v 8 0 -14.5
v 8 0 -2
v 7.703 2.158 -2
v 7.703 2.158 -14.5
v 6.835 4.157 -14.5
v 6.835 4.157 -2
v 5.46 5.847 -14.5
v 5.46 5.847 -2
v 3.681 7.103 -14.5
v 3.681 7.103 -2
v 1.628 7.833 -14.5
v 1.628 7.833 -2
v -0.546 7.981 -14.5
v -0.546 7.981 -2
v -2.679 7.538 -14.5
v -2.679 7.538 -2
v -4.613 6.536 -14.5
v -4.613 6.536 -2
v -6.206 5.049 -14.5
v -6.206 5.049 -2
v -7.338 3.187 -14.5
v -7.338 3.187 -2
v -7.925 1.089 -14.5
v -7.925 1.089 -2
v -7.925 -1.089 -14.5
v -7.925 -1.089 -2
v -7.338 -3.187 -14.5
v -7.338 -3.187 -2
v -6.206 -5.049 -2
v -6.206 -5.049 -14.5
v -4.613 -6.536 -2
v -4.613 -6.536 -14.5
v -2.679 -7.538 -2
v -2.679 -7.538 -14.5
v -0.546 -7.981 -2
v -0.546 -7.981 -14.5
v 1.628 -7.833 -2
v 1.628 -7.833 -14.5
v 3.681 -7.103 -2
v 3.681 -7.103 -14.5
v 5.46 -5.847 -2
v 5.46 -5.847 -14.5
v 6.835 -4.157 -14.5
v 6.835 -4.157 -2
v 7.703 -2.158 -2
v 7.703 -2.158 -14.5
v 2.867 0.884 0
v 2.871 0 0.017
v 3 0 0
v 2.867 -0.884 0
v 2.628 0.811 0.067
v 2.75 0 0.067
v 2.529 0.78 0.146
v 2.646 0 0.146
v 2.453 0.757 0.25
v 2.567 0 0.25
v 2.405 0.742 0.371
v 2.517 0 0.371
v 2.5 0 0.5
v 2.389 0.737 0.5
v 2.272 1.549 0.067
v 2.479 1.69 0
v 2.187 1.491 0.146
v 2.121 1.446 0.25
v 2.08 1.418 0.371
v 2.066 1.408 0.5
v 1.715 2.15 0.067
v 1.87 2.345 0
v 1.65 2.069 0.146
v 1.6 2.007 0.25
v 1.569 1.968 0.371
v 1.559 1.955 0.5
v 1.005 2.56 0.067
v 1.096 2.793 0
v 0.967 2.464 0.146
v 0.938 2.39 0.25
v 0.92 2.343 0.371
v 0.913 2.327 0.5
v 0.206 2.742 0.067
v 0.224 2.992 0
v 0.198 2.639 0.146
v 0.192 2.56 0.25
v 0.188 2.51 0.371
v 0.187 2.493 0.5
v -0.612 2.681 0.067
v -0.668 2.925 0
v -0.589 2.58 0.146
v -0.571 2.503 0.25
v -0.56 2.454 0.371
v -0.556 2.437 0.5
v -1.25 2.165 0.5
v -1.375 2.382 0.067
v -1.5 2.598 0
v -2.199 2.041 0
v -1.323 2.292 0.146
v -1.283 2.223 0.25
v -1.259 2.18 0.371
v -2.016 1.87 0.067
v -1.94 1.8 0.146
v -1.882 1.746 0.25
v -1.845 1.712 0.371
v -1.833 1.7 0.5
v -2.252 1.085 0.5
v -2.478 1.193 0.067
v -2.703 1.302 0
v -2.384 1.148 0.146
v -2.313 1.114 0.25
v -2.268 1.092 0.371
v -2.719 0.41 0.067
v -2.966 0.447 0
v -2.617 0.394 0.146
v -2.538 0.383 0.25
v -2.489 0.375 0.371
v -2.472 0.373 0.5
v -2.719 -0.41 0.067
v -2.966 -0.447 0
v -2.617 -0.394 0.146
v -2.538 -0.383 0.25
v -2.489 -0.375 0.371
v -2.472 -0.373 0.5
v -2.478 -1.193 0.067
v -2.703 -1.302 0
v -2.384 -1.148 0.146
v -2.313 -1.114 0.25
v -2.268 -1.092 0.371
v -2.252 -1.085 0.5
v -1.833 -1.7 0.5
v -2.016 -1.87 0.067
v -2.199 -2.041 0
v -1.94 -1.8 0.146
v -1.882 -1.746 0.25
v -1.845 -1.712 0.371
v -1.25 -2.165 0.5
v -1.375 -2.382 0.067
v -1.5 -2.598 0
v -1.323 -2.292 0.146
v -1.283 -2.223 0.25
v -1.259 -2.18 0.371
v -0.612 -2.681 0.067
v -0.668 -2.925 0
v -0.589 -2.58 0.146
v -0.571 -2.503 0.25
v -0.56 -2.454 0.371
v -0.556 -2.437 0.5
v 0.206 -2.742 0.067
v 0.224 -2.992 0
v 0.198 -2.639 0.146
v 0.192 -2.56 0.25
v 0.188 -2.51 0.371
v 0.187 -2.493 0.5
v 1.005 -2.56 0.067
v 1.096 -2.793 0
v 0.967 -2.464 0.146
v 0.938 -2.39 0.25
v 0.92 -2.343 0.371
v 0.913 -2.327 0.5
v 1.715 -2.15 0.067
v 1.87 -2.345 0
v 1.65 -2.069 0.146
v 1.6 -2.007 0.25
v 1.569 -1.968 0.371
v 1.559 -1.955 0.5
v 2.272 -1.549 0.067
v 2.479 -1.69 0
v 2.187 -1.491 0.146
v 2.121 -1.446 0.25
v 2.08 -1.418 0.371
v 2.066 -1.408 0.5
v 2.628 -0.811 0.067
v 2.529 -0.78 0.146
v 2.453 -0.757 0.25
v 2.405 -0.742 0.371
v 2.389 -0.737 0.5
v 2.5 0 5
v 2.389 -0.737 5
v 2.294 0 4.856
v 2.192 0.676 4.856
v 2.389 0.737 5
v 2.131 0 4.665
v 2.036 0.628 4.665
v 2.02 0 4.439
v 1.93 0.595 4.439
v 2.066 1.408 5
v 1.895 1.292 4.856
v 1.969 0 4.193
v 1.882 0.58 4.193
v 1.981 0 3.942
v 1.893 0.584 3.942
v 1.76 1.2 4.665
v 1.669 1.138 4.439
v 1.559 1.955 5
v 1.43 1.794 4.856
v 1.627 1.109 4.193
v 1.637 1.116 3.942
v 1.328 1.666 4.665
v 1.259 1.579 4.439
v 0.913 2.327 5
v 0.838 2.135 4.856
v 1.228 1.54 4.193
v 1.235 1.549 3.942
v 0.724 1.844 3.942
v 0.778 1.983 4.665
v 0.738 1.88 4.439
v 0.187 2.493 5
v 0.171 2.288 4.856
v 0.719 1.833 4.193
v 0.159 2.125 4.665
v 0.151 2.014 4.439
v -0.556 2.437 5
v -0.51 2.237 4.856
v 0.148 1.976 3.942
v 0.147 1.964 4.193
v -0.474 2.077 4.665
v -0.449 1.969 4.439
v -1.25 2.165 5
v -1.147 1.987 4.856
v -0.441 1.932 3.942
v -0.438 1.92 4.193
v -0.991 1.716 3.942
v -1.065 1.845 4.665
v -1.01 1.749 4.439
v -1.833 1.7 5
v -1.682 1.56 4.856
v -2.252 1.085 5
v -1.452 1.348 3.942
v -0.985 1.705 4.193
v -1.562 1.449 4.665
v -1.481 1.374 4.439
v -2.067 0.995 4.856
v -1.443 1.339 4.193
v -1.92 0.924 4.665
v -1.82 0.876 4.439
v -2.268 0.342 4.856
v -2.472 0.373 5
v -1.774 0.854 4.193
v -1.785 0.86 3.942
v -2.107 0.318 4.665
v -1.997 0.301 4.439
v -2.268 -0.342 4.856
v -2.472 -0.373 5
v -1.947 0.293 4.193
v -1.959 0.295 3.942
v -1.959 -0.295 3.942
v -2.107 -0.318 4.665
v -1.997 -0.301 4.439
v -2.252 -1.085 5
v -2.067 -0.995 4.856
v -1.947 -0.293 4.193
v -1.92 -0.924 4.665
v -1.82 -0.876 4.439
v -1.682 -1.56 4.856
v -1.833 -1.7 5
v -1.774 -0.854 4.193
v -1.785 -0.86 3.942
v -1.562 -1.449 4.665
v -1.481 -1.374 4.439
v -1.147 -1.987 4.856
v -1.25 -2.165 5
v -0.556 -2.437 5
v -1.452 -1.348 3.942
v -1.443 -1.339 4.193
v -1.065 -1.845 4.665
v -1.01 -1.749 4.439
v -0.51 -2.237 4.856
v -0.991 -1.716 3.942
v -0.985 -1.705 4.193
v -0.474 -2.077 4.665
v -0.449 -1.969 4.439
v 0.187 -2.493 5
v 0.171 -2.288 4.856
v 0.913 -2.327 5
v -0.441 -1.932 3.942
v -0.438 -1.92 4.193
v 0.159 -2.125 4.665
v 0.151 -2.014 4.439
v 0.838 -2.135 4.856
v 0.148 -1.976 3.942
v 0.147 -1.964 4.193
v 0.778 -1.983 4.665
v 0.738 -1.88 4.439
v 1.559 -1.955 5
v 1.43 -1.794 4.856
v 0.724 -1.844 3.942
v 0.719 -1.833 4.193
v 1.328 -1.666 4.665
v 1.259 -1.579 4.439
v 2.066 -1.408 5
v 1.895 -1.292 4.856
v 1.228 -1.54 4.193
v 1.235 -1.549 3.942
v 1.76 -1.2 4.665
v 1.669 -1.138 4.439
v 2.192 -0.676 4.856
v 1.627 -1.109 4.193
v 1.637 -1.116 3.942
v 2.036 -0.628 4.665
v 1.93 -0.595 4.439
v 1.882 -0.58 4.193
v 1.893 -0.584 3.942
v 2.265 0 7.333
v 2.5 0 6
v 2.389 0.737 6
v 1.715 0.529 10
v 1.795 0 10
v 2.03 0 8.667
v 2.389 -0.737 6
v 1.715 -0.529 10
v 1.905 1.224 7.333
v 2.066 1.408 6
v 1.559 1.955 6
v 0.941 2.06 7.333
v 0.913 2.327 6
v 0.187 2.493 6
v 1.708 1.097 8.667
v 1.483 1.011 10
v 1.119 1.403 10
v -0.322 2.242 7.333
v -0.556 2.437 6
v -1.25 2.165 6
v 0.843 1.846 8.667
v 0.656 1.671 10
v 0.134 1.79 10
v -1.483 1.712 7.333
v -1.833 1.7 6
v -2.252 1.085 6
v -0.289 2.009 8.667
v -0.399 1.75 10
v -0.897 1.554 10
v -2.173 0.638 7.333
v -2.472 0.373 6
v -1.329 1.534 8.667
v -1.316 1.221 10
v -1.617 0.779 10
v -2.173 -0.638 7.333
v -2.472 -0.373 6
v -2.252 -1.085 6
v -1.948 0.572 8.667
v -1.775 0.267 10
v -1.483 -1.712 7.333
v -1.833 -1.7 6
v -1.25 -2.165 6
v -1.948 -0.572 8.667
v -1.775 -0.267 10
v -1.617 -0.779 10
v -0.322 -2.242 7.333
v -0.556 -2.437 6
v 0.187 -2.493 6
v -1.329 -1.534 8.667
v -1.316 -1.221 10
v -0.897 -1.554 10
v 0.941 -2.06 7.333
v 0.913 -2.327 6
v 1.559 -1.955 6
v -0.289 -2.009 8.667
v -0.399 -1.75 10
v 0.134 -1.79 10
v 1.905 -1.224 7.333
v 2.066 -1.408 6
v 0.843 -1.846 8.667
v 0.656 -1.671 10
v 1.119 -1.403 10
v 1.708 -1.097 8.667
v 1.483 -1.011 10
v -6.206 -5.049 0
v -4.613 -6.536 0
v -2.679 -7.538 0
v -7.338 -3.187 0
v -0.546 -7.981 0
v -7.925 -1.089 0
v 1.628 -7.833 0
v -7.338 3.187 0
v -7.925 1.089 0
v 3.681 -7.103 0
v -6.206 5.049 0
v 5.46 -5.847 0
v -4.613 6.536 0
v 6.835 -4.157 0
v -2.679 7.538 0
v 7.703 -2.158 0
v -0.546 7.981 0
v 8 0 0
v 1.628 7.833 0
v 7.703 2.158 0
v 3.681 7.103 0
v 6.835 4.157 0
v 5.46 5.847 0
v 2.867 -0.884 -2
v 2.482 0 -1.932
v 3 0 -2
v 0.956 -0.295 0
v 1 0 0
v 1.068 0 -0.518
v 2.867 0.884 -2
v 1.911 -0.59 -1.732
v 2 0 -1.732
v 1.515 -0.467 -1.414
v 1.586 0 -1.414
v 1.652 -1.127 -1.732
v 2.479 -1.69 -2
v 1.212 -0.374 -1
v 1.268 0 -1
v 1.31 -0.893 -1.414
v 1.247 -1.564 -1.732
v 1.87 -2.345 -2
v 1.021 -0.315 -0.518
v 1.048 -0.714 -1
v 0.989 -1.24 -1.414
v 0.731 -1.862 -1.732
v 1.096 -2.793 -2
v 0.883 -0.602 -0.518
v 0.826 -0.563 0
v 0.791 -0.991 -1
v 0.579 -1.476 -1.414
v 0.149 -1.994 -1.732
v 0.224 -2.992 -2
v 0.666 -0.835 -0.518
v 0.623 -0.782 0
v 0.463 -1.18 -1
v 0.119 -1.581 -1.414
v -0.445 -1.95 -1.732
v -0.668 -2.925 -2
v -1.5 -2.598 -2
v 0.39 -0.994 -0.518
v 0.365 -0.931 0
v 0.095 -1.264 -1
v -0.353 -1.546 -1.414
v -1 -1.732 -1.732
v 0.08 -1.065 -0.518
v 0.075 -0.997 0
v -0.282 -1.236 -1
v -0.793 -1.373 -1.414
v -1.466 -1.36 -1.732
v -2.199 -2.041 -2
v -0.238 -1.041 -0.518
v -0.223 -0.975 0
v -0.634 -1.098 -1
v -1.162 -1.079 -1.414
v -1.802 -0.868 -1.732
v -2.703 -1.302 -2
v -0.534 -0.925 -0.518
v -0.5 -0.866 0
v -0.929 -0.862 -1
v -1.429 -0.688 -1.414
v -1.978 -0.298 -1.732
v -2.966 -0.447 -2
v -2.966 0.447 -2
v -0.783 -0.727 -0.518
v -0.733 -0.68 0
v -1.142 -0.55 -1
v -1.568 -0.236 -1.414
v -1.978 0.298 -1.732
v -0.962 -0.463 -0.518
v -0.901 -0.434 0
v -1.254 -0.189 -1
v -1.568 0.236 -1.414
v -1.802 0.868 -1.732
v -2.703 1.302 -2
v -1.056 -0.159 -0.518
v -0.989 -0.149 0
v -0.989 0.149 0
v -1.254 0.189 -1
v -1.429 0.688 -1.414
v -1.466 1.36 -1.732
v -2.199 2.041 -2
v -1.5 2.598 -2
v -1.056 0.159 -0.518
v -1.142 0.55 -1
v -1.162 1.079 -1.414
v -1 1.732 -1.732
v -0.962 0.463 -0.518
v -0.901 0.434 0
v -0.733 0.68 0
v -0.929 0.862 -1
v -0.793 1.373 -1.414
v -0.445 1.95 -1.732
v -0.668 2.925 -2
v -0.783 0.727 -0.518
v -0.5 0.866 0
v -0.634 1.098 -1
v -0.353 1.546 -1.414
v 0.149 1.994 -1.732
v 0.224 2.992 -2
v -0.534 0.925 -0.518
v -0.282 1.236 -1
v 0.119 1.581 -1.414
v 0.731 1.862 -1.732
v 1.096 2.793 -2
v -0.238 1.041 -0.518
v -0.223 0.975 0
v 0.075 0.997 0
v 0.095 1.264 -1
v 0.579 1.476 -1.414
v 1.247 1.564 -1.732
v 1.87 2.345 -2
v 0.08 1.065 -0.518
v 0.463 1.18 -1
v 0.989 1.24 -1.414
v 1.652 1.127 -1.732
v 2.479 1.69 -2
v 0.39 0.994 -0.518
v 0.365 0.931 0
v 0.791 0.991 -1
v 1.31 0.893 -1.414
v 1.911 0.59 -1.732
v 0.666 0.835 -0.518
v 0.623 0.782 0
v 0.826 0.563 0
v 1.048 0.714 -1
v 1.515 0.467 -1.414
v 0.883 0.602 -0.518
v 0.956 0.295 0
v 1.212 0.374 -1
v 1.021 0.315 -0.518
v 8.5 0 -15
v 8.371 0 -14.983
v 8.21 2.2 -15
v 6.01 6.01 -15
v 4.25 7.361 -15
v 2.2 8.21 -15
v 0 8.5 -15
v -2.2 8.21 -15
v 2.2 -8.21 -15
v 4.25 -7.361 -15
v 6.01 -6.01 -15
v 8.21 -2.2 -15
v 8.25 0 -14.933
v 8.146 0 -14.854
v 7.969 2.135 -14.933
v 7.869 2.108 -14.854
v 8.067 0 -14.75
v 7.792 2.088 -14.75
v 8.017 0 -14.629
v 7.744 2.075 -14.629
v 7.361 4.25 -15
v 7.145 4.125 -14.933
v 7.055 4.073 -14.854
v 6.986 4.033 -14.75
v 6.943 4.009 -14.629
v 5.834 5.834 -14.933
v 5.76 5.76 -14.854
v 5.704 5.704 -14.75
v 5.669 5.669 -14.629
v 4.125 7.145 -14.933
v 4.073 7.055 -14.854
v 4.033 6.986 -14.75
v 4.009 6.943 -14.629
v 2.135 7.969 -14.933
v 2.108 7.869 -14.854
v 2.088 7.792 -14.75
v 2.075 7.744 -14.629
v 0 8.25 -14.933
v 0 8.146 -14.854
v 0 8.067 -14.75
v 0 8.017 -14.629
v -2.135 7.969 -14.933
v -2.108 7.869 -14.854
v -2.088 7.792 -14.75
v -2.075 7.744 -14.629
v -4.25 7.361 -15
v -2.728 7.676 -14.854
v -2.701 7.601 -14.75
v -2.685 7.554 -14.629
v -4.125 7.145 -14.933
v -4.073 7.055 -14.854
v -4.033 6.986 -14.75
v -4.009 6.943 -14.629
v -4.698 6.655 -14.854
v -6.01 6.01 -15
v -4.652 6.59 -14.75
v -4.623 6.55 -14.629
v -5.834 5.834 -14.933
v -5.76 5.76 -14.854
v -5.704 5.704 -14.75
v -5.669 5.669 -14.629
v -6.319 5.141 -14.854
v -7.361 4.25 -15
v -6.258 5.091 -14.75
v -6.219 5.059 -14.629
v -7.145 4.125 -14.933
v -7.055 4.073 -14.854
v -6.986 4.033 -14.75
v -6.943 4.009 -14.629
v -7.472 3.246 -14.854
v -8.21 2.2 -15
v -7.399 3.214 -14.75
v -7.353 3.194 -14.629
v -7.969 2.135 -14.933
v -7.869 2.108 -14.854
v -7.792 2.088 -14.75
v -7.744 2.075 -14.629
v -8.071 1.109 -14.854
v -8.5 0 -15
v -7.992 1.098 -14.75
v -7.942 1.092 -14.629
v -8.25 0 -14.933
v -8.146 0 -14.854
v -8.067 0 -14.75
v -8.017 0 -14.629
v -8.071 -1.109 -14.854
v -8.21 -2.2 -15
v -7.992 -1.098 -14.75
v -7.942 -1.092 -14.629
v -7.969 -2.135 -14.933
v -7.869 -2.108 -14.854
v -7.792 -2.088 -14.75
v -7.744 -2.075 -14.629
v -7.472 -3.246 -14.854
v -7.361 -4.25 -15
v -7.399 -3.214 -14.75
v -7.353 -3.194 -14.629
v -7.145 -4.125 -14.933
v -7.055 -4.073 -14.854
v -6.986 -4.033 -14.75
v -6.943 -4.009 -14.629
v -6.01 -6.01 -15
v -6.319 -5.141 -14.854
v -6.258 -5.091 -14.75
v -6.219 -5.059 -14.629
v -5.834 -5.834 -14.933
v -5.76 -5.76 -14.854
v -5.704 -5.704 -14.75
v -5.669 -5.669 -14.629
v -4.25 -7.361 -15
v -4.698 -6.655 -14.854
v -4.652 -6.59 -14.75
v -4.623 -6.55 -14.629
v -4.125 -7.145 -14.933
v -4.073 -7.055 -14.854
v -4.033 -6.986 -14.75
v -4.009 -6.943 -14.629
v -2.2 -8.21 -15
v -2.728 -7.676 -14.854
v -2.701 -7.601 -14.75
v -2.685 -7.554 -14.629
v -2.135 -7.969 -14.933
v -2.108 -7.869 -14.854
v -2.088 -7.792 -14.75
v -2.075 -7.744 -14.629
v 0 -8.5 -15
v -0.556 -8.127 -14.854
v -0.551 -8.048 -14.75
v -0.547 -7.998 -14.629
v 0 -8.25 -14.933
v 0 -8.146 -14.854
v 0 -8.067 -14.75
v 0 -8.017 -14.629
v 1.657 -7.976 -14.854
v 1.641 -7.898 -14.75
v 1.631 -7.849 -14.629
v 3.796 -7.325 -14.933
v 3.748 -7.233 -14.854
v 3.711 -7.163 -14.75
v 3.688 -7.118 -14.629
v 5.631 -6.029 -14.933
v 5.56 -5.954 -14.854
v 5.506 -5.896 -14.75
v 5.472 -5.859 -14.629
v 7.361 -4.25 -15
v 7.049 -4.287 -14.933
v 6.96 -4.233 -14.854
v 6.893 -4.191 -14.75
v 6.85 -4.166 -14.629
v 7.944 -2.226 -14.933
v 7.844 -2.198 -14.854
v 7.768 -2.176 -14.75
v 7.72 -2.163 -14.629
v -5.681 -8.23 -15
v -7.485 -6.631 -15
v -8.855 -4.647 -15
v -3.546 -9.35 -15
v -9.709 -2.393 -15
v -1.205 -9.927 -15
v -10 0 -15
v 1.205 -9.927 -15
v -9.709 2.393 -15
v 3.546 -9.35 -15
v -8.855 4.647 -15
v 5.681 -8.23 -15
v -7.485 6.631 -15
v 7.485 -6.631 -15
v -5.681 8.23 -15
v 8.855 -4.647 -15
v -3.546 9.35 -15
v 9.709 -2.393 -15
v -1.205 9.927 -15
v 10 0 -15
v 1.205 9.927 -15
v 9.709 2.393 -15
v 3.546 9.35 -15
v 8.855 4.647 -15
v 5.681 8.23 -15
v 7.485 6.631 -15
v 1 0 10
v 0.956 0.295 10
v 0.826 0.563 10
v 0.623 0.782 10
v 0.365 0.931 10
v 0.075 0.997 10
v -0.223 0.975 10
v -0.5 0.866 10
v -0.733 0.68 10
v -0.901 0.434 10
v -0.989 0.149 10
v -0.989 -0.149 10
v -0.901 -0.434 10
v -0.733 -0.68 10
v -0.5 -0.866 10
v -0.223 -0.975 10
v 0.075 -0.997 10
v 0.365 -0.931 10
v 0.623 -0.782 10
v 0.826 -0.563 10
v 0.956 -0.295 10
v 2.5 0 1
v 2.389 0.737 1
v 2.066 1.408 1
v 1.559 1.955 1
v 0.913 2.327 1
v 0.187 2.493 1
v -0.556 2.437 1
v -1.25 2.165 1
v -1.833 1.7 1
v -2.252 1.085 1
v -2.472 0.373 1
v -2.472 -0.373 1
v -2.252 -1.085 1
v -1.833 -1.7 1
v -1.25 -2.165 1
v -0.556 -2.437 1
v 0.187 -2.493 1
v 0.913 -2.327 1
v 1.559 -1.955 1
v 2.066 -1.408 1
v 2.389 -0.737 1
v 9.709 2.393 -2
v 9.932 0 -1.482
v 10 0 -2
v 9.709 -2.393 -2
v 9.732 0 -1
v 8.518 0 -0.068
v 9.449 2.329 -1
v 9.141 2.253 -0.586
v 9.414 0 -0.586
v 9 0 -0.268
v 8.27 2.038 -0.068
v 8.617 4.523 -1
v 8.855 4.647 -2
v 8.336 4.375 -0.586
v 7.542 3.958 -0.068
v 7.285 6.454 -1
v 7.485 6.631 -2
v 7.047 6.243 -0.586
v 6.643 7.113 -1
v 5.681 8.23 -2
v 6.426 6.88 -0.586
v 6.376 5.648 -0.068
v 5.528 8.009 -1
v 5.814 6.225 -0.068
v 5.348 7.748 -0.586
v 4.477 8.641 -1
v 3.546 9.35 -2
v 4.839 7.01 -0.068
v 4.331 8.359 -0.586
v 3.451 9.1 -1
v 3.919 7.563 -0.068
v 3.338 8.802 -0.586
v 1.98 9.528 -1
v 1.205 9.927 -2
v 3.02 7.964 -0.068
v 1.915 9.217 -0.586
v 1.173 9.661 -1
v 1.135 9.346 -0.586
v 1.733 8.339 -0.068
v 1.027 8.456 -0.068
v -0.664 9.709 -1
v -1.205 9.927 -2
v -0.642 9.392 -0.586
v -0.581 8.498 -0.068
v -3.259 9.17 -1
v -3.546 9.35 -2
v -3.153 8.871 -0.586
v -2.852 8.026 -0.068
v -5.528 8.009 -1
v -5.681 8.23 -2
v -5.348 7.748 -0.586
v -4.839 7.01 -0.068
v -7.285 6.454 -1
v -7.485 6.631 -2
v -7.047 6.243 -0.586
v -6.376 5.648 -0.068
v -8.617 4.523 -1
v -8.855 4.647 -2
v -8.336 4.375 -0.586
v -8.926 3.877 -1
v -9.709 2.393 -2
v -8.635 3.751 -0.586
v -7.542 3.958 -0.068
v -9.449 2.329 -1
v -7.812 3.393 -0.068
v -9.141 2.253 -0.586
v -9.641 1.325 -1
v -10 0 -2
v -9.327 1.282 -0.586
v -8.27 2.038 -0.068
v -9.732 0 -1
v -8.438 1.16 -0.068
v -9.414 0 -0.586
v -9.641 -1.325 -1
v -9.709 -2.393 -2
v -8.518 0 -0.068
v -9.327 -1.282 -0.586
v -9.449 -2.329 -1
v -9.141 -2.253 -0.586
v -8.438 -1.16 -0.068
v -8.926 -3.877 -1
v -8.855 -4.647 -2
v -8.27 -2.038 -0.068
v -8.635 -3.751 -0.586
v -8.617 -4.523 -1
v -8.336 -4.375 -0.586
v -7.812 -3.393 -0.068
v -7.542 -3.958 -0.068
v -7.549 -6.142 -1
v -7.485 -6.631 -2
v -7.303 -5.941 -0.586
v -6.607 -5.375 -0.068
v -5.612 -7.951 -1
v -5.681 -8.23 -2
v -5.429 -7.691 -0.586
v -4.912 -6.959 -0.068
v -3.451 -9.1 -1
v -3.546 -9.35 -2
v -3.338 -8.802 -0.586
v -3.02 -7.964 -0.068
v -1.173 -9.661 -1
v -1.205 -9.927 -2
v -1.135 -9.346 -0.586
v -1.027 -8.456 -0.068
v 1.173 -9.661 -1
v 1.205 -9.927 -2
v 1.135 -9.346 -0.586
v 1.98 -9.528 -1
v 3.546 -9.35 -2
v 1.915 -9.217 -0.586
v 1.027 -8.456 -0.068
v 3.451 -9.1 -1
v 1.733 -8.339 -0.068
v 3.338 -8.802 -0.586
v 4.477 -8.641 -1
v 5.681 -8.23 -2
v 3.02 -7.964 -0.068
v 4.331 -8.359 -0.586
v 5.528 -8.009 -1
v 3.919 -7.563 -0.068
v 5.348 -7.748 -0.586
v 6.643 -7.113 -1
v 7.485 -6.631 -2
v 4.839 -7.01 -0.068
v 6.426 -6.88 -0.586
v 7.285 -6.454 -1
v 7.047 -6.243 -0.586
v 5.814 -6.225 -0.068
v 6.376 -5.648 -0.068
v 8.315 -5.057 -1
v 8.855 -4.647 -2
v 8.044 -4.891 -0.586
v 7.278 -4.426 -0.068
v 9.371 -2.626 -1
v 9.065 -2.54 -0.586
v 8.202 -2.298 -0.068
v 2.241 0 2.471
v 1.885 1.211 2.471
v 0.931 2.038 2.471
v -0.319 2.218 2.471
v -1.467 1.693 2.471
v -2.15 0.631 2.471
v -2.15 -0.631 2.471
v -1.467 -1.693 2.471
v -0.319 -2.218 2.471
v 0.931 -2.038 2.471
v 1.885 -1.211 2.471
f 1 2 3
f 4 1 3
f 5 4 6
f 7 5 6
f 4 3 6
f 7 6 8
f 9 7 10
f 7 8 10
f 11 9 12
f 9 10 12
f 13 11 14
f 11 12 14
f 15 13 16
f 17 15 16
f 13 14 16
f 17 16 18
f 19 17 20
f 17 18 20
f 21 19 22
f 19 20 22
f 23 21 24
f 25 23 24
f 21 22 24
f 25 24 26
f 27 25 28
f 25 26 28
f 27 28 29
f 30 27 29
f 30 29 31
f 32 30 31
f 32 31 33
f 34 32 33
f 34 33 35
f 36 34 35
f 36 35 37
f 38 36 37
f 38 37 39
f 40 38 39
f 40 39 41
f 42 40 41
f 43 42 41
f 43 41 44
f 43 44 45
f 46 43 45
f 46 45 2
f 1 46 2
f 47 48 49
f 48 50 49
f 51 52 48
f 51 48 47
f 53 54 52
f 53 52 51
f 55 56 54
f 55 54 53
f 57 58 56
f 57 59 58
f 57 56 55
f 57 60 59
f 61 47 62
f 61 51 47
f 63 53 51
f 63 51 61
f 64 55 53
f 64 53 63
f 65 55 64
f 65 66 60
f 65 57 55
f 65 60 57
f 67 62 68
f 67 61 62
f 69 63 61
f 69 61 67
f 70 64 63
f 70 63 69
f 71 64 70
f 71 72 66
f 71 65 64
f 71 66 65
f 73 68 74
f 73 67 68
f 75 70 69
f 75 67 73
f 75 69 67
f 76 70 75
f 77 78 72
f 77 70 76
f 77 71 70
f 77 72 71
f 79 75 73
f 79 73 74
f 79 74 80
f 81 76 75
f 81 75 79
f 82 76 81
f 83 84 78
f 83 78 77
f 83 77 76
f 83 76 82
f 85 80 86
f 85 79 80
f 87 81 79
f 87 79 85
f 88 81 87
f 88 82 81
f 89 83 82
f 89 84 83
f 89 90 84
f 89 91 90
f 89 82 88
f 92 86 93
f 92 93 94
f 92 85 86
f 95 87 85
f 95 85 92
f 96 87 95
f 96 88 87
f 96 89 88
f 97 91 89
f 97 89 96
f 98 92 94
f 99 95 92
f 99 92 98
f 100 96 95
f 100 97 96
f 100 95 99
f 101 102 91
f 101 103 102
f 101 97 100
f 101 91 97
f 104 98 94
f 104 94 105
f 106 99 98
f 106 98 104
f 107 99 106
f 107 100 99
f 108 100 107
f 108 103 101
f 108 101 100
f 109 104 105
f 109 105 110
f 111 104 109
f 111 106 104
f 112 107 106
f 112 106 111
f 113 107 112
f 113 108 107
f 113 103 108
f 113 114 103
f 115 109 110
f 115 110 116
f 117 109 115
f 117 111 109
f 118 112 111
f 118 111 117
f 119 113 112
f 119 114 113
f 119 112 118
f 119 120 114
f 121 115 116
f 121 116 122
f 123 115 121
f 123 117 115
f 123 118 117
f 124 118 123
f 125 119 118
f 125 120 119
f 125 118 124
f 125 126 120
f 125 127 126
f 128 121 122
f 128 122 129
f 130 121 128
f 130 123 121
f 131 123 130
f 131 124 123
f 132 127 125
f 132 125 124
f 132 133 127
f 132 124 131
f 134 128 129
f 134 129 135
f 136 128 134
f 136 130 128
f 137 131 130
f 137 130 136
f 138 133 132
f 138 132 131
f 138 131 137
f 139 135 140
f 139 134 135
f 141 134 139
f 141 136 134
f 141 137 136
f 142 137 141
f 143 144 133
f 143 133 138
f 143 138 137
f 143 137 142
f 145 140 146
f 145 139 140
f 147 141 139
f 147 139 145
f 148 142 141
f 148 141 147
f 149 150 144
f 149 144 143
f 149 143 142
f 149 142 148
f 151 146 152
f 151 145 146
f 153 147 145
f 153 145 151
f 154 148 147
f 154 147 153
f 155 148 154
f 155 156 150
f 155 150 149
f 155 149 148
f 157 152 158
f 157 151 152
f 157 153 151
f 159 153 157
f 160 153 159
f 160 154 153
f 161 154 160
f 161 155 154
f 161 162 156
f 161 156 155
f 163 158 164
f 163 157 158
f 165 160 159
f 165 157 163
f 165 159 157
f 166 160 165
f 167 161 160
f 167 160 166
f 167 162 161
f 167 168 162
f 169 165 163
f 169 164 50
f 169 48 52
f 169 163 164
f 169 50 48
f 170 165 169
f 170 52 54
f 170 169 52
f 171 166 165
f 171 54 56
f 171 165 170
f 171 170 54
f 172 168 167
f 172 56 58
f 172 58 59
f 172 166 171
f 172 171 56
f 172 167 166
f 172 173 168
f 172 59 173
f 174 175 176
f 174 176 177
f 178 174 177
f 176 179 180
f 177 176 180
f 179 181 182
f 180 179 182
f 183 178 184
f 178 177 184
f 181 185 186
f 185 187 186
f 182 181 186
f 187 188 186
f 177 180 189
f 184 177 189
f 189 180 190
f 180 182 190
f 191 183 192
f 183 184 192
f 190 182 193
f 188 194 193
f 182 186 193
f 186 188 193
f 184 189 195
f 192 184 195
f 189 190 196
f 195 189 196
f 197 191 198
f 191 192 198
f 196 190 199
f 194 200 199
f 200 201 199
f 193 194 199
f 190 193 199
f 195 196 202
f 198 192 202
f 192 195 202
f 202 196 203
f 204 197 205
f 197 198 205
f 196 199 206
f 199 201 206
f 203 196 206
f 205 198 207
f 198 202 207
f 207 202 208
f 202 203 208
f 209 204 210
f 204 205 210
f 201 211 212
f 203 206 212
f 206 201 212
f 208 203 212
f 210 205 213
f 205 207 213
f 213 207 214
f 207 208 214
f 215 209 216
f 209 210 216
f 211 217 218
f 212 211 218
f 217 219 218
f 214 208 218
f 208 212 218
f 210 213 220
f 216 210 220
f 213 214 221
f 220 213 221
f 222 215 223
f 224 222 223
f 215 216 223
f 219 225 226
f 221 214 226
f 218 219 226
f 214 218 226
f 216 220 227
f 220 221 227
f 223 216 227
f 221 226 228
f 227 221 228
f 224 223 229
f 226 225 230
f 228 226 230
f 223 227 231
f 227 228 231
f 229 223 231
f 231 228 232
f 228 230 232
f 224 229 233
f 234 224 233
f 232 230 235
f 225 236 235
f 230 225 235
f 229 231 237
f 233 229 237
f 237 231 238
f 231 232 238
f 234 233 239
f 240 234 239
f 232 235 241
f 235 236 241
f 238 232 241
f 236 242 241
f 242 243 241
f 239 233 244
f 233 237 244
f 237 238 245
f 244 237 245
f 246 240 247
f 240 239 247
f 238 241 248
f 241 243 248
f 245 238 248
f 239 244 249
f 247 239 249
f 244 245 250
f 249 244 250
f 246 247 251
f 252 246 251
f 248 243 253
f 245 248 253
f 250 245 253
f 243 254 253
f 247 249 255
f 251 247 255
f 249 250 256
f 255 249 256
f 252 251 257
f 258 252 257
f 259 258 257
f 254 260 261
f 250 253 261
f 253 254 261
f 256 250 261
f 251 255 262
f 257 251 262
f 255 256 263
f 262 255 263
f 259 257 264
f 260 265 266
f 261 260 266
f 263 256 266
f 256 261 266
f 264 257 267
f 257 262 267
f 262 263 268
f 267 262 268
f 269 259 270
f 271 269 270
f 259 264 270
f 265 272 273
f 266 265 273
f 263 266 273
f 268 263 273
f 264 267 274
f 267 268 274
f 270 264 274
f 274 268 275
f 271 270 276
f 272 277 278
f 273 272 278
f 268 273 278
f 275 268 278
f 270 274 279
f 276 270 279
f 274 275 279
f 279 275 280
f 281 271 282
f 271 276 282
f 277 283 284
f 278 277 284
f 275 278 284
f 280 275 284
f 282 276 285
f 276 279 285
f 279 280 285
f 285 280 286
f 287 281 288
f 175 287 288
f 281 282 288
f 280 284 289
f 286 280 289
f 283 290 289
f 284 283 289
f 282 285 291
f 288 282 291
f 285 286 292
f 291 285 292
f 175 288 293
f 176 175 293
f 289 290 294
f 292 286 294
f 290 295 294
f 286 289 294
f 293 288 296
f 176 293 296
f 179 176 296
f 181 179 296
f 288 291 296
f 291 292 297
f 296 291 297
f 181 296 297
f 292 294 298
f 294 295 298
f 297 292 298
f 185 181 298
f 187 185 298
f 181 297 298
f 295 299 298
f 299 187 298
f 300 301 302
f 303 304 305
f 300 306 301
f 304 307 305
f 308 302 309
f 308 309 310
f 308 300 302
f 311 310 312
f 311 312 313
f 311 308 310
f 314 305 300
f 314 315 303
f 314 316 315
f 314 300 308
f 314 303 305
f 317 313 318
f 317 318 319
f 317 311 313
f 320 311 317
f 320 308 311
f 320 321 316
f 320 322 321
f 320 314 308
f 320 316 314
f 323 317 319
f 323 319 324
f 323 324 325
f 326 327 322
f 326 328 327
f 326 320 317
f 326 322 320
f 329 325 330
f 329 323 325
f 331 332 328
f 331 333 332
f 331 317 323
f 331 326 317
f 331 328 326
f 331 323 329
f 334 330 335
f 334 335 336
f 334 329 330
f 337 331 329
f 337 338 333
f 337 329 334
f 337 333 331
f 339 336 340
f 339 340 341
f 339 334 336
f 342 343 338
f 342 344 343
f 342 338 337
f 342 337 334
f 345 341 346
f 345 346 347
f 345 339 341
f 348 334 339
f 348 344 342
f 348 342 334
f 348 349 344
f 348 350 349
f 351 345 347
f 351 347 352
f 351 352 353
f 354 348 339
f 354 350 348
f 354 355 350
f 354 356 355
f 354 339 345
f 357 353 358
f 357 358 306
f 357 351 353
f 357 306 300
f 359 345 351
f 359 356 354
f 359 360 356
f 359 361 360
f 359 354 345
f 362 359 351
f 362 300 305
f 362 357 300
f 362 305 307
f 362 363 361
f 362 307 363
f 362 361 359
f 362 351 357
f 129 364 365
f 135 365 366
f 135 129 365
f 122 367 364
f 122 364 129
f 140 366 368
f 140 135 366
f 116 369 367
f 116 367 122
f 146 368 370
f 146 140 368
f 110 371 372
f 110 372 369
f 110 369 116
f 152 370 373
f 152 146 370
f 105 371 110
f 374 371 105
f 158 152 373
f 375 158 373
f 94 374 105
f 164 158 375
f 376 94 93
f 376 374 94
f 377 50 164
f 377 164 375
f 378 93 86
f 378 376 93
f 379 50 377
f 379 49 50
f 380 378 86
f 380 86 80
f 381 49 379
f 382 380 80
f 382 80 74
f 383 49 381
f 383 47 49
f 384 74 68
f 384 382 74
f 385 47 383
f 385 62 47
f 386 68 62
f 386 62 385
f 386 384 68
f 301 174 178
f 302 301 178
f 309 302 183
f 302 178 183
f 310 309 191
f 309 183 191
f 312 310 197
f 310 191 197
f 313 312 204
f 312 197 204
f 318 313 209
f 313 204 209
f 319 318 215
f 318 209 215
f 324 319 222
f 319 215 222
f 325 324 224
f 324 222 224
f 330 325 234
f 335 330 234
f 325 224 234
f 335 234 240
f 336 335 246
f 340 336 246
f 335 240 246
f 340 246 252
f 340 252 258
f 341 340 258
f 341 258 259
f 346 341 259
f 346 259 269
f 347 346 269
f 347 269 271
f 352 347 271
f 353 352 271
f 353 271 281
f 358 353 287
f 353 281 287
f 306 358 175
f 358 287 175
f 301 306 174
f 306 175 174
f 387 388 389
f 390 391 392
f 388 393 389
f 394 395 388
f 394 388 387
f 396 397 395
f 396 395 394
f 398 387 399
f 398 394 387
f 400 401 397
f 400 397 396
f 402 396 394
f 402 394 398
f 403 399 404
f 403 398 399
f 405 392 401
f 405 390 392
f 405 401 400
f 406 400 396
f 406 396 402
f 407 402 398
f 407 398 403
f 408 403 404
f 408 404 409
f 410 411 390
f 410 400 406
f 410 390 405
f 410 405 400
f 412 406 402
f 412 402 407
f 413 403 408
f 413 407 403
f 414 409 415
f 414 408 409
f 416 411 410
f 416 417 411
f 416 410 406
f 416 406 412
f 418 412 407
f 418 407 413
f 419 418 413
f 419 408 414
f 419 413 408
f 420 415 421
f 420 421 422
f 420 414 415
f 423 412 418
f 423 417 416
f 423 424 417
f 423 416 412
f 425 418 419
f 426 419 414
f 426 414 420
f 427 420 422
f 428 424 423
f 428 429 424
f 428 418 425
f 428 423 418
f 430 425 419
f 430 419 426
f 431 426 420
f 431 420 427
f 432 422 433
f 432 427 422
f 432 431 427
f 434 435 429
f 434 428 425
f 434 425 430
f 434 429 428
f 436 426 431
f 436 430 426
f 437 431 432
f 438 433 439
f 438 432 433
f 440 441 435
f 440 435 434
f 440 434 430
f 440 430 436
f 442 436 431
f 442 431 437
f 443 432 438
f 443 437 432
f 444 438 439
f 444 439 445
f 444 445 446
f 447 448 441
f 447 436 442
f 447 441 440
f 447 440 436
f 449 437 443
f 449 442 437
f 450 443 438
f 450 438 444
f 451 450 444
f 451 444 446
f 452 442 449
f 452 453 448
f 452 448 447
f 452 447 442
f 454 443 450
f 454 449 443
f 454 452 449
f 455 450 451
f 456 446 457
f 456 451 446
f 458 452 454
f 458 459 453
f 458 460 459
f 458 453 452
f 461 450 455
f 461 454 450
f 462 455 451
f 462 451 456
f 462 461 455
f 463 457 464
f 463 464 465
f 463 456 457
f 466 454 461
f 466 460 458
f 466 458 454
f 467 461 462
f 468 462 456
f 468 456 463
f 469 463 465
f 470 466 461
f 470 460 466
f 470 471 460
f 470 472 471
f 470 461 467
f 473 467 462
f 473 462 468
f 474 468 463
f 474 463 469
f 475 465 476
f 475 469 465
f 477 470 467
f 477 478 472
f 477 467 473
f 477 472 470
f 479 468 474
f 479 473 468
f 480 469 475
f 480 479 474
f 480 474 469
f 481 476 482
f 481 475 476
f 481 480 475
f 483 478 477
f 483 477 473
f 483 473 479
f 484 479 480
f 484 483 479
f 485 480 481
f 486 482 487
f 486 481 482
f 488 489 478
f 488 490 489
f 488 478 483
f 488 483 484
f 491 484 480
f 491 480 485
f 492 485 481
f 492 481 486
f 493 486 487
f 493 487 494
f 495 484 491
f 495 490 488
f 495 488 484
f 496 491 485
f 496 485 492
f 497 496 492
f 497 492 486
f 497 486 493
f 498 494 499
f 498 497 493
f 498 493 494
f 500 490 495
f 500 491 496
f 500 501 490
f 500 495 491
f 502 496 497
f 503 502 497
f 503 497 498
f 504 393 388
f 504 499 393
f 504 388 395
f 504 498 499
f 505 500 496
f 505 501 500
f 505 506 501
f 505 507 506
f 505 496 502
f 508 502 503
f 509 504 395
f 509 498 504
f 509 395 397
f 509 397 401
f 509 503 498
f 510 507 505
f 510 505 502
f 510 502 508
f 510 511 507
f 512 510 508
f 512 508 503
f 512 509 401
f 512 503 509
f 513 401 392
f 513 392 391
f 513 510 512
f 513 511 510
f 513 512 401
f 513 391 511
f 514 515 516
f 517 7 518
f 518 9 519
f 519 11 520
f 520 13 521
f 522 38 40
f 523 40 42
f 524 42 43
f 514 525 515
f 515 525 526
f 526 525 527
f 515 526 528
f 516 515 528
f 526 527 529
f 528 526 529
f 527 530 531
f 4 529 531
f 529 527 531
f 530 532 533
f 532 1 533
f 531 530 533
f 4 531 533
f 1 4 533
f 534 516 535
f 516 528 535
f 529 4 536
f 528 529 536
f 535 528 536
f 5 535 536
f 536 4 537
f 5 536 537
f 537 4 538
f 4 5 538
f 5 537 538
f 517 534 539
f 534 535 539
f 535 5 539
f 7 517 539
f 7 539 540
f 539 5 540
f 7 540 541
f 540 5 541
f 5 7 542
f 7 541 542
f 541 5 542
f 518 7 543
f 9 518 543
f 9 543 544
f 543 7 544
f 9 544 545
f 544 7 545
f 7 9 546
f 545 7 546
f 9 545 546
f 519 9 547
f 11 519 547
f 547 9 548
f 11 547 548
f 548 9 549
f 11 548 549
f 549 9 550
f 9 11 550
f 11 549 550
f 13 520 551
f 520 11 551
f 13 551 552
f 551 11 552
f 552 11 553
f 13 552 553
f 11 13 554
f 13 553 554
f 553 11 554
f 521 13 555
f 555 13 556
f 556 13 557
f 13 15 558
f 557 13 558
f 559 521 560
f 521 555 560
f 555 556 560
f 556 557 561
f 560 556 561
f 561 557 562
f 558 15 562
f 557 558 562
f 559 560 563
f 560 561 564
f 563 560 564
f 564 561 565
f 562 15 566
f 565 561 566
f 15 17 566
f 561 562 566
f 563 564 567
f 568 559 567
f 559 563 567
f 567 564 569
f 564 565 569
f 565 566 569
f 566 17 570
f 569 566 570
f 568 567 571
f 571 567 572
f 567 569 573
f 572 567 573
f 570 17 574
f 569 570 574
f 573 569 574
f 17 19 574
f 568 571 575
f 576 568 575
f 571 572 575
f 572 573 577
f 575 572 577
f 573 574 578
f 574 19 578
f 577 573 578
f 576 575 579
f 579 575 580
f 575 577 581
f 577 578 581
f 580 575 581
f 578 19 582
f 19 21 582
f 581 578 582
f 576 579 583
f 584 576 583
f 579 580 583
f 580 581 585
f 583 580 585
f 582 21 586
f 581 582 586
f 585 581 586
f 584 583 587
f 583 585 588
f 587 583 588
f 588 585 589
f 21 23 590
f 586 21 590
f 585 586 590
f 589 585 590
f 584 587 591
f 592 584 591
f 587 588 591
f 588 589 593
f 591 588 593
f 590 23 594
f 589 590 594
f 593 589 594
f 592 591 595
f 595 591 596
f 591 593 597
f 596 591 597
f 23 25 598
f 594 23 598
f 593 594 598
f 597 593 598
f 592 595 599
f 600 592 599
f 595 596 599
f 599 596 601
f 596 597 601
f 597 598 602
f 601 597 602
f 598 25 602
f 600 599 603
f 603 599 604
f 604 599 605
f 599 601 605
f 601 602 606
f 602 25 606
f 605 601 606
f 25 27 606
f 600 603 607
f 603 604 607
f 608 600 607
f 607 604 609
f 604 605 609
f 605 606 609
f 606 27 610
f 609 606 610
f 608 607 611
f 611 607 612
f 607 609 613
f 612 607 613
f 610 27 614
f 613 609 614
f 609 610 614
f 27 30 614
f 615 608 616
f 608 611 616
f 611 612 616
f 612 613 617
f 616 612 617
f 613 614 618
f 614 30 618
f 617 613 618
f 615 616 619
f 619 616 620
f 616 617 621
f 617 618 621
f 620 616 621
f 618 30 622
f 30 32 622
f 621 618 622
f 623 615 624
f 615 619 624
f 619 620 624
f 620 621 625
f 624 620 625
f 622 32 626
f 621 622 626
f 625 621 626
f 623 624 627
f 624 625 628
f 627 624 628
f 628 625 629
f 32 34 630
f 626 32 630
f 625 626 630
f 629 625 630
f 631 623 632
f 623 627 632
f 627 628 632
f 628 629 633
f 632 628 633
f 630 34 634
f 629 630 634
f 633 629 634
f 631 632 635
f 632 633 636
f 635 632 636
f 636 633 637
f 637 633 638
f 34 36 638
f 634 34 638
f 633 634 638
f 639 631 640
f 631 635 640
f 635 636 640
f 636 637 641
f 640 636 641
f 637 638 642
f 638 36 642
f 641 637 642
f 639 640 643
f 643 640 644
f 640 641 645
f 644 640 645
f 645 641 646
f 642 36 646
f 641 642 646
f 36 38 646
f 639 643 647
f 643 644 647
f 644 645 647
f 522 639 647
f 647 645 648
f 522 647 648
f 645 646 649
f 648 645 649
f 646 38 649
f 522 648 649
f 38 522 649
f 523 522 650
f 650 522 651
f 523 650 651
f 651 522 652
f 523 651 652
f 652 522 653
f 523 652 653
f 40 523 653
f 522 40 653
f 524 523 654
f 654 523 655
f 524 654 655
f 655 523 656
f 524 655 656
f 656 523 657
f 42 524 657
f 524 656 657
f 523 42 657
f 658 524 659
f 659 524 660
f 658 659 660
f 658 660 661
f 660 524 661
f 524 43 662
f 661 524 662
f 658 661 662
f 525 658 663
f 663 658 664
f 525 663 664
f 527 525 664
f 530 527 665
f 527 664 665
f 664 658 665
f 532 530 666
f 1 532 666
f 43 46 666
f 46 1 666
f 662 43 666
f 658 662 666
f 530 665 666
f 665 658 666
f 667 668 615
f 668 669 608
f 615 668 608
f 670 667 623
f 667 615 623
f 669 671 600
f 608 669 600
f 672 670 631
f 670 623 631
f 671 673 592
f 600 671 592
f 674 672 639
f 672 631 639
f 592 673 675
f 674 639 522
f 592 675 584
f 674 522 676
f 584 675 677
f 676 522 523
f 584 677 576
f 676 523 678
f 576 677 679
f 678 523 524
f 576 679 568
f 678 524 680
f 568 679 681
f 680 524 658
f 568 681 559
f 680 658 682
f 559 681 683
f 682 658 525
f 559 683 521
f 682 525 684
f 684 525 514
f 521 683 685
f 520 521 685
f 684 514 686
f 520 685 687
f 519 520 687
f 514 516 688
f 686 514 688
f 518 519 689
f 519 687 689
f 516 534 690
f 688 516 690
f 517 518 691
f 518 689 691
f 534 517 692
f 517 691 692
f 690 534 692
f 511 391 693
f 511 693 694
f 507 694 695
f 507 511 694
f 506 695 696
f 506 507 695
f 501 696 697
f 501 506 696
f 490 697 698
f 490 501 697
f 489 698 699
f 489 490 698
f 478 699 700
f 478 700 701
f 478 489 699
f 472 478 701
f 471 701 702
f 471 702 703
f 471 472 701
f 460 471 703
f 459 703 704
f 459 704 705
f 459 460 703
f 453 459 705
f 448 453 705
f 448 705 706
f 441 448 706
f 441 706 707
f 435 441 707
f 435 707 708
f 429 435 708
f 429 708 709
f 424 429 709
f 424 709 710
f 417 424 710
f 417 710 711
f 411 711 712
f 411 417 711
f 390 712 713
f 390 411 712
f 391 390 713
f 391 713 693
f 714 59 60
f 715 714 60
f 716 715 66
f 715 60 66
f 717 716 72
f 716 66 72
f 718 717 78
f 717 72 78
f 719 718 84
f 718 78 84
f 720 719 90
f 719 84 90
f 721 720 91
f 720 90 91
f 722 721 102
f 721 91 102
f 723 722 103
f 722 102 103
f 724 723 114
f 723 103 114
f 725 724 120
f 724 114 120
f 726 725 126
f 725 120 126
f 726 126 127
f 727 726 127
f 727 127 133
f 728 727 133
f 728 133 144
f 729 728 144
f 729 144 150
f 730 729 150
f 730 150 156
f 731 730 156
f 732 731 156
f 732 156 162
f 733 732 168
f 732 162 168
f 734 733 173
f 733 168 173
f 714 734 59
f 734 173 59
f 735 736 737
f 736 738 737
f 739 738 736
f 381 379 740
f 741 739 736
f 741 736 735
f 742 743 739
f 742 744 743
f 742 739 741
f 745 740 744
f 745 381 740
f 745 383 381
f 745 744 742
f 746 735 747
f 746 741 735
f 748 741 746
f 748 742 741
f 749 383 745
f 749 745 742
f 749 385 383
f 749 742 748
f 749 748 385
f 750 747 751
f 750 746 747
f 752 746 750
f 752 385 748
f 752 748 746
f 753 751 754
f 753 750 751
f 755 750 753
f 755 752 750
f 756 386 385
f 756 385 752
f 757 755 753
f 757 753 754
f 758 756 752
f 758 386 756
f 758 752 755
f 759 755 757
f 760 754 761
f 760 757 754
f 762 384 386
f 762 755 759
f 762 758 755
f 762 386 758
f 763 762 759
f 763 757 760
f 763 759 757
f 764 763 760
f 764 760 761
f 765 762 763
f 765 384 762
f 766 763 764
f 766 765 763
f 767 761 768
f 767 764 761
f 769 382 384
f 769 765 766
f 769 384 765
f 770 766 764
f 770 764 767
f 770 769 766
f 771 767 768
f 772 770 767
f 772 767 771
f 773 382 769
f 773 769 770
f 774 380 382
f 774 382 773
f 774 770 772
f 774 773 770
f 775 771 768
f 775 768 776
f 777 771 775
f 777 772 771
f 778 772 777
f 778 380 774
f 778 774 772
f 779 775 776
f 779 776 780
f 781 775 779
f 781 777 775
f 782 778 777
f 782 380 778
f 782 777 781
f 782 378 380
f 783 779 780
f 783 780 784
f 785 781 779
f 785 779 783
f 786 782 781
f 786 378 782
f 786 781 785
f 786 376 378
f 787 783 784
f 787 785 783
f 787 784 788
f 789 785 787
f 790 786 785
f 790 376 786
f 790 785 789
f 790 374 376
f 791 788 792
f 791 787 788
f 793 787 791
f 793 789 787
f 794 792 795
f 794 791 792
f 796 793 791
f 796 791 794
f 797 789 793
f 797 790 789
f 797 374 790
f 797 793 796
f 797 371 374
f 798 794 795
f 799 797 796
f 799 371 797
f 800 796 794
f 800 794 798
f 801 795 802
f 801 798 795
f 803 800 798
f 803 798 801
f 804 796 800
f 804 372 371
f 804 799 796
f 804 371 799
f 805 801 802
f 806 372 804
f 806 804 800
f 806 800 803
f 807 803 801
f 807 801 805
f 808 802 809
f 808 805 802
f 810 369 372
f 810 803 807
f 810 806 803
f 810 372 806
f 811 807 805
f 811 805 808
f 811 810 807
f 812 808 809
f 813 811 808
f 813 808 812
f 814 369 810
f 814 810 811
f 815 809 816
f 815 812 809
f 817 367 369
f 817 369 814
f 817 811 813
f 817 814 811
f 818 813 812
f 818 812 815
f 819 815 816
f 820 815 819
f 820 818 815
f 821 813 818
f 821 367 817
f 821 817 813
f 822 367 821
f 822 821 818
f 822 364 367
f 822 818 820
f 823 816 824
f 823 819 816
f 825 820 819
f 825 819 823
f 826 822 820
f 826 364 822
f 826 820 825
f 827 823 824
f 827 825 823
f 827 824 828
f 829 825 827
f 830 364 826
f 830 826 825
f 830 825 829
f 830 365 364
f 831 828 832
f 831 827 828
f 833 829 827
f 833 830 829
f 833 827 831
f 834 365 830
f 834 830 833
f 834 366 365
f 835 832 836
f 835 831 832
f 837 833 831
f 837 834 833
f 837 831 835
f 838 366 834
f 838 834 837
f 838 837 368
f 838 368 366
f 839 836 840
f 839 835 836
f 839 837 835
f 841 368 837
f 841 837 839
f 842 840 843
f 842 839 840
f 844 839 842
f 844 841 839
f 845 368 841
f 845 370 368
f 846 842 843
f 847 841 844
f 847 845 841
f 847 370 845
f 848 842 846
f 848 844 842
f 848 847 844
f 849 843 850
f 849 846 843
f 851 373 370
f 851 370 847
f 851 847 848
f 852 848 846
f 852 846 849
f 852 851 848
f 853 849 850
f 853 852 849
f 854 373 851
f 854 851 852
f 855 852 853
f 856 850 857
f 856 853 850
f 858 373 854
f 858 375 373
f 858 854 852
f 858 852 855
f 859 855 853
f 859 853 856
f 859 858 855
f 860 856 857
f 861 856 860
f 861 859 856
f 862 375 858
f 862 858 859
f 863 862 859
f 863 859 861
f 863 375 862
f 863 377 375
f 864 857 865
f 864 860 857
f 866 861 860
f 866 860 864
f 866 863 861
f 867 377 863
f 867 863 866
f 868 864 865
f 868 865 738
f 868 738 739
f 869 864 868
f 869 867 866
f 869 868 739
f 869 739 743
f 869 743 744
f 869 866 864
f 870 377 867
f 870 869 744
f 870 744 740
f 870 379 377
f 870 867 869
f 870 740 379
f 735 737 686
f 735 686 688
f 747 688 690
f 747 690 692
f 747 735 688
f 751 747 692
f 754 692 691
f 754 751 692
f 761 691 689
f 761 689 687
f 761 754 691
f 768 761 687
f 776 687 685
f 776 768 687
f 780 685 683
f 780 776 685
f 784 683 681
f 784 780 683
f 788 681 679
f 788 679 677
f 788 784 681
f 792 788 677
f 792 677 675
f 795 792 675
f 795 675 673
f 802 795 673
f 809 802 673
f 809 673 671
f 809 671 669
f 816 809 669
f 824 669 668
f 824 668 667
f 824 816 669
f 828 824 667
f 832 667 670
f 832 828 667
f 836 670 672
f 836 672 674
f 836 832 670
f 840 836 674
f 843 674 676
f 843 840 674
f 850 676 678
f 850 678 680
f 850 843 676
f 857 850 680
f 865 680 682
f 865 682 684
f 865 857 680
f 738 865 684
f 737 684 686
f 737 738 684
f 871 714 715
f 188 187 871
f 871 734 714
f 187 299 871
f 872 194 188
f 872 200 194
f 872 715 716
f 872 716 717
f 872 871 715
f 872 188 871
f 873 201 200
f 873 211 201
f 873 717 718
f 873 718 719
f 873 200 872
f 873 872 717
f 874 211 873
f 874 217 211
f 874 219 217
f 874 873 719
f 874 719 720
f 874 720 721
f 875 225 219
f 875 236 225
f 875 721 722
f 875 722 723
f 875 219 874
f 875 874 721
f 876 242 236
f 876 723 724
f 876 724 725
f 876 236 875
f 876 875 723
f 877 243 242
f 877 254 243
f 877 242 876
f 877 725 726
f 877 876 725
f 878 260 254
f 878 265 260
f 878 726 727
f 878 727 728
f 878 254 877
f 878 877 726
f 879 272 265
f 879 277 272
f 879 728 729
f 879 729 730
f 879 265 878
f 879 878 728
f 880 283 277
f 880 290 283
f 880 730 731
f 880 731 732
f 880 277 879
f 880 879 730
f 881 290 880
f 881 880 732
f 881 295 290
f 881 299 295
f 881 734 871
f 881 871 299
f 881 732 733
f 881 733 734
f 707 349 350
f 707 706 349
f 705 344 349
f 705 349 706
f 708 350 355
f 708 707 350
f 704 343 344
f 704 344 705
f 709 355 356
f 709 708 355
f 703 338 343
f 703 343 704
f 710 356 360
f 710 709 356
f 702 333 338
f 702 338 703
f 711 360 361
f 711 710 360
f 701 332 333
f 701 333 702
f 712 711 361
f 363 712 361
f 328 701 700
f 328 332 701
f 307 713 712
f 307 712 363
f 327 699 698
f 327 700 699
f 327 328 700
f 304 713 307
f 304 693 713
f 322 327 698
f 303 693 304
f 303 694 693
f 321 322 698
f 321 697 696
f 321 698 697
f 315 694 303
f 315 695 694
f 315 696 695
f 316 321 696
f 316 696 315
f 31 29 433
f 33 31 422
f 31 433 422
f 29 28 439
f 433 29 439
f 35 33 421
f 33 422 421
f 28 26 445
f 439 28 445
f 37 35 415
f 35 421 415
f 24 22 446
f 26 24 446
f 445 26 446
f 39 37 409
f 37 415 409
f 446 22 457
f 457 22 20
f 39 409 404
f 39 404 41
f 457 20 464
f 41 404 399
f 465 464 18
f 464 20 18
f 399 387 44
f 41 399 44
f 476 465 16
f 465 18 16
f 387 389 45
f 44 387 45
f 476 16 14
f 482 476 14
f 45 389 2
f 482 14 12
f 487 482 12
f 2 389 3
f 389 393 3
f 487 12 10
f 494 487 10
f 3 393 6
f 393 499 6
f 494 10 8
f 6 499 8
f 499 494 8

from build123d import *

# Parameters (mm, degrees)
SKETCH1_R                   = 2.5
SKETCH1_R_2                 = 1
BOSS_EXTRUDE1_DEPTH         = 5
CHAMFER2_SIZE               = 4
CHAMFER2_SIZE2              = 0.705307923
LPATTERN2_COUNT             = 2
LPATTERN2_PITCH             = 5
CHAMFER2_OF_LPATTERN2_SIZE2 = 0.705307923
CHAMFER2_OF_LPATTERN2_SIZE  = 4
FILLET1_R                   = 1
SKETCH2_R                   = 10
BOSS_EXTRUDE2_DEPTH         = 15
CUT_EXTRUDE1_START          = -2
SKETCH3_R                   = 8
CUT_EXTRUDE1_DEPTH          = 15
CUT_EXTRUDE2_START          = -15
SKETCH4_R                   = 1
CUT_EXTRUDE2_DEPTH          = 15
FILLET2_R                   = 2
FILLET3_R                   = 2
FILLET4_R                   = 0.5
FILLET5_R                   = 0.5


with BuildPart() as part:
    # Sketch1 → Boss-Extrude1 (new body)
    with BuildSketch(Plane.XY):
        Circle(SKETCH1_R)
        Circle(SKETCH1_R_2, mode=Mode.SUBTRACT)
    boss_extrude1 = extrude(amount=BOSS_EXTRUDE1_DEPTH)

    # Chamfer2
    chamfer2_edges = [part.edges().sort_by_distance(p)[0] for p in [
        (-2.5, 0, 5),
    ]]
    chamfer2_side = [part.faces().sort_by_distance(p)[0] for p in [
        (-2.5, 0, 2.5),
    ]]
    chamfer(chamfer2_edges, length=CHAMFER2_SIZE, length2=CHAMFER2_SIZE2, reference=chamfer2_side[0])


with BuildPart() as lpattern2_1:
    # LPattern2: Boss-Extrude1 ×2
    with Locations(*[(0, 0, i * LPATTERN2_PITCH) for i in range(1, LPATTERN2_COUNT)]):
        add(boss_extrude1)

    # Chamfer2 of LPattern2
    chamfer2_of_lpattern2_edges = [lpattern2_1.edges().sort_by_distance(p)[0] for p in [
        (-2.5, 0, 10),
    ]]
    chamfer(chamfer2_of_lpattern2_edges, length=CHAMFER2_OF_LPATTERN2_SIZE, length2=CHAMFER2_OF_LPATTERN2_SIZE2)


with BuildPart() as part_1:
    add(part.part)

    # LPattern2 united with what the copies to: union LPattern2_1
    add(lpattern2_1.part)

    # Fillet1
    # the kernel refuses this fillet: 1 mm, written as the material it adds along each edge
    with BuildSketch(Plane(origin=(0, 0, 5), x_dir=(1, 0, 0), z_dir=(0, -1, 0))) as fillet1_piece_1:
        with BuildLine():
            CenterArc((2.96611905, -0.884722008), FILLET1_R, 117.782669079, 72.217330921)
            Line((1.981311297, -1.058370186), (1.961615141, -1.061843149))
            Line((1.961615141, -1.061843149), (1.774995922, -0.003472964))
            Line((1.774995922, -0.003472964), (1.794692077, 0.02))
            ThreePointArc((1.794692077, 0.02), (2.147346039, 0.02), (2.490677619, 0.01769444))
            Line((2.490677619, 0.01769444), (2.5, 0))
        make_face()
    revolve(axis=Axis((0, 0, 5), (0, 0, 1)))

    # Sketch2 → Boss-Extrude2 (add)
    with BuildSketch(Plane.XY):
        Circle(SKETCH2_R)
    extrude(amount=-BOSS_EXTRUDE2_DEPTH)

    # Sketch3 → Cut-Extrude1 (cut)
    with BuildSketch(Plane.XY.offset(CUT_EXTRUDE1_START)):
        Circle(SKETCH3_R)
    extrude(amount=-CUT_EXTRUDE1_DEPTH, mode=Mode.SUBTRACT)

    # Sketch4 → Cut-Extrude2 (cut)
    with BuildSketch(Plane.XY.offset(CUT_EXTRUDE2_START)):
        Circle(SKETCH4_R)
    extrude(amount=CUT_EXTRUDE2_DEPTH, mode=Mode.SUBTRACT)

    # Fillet2
    fillet2_edges = [part_1.edges().sort_by_distance(p)[0] for p in [
        (-1, 0, -2),
    ]]
    fillet(fillet2_edges, radius=FILLET2_R)

    # Fillet3
    fillet3_edges = [part_1.edges().sort_by_distance(p)[0] for p in [
        (-10, 0, 0),
    ]]
    fillet(fillet3_edges, radius=FILLET3_R)

    # Fillet4
    fillet4_edges = [part_1.edges().sort_by_distance(p)[0] for p in [
        (-2.5, 0, 0),
    ]]
    fillet(fillet4_edges, radius=FILLET4_R)

    # Fillet5
    fillet5_edges = [part_1.edges().sort_by_distance(p)[0] for p in [
        (-8, 0, -15),
    ]]
    fillet(fillet5_edges, radius=FILLET5_R)


solid = part_1.part
